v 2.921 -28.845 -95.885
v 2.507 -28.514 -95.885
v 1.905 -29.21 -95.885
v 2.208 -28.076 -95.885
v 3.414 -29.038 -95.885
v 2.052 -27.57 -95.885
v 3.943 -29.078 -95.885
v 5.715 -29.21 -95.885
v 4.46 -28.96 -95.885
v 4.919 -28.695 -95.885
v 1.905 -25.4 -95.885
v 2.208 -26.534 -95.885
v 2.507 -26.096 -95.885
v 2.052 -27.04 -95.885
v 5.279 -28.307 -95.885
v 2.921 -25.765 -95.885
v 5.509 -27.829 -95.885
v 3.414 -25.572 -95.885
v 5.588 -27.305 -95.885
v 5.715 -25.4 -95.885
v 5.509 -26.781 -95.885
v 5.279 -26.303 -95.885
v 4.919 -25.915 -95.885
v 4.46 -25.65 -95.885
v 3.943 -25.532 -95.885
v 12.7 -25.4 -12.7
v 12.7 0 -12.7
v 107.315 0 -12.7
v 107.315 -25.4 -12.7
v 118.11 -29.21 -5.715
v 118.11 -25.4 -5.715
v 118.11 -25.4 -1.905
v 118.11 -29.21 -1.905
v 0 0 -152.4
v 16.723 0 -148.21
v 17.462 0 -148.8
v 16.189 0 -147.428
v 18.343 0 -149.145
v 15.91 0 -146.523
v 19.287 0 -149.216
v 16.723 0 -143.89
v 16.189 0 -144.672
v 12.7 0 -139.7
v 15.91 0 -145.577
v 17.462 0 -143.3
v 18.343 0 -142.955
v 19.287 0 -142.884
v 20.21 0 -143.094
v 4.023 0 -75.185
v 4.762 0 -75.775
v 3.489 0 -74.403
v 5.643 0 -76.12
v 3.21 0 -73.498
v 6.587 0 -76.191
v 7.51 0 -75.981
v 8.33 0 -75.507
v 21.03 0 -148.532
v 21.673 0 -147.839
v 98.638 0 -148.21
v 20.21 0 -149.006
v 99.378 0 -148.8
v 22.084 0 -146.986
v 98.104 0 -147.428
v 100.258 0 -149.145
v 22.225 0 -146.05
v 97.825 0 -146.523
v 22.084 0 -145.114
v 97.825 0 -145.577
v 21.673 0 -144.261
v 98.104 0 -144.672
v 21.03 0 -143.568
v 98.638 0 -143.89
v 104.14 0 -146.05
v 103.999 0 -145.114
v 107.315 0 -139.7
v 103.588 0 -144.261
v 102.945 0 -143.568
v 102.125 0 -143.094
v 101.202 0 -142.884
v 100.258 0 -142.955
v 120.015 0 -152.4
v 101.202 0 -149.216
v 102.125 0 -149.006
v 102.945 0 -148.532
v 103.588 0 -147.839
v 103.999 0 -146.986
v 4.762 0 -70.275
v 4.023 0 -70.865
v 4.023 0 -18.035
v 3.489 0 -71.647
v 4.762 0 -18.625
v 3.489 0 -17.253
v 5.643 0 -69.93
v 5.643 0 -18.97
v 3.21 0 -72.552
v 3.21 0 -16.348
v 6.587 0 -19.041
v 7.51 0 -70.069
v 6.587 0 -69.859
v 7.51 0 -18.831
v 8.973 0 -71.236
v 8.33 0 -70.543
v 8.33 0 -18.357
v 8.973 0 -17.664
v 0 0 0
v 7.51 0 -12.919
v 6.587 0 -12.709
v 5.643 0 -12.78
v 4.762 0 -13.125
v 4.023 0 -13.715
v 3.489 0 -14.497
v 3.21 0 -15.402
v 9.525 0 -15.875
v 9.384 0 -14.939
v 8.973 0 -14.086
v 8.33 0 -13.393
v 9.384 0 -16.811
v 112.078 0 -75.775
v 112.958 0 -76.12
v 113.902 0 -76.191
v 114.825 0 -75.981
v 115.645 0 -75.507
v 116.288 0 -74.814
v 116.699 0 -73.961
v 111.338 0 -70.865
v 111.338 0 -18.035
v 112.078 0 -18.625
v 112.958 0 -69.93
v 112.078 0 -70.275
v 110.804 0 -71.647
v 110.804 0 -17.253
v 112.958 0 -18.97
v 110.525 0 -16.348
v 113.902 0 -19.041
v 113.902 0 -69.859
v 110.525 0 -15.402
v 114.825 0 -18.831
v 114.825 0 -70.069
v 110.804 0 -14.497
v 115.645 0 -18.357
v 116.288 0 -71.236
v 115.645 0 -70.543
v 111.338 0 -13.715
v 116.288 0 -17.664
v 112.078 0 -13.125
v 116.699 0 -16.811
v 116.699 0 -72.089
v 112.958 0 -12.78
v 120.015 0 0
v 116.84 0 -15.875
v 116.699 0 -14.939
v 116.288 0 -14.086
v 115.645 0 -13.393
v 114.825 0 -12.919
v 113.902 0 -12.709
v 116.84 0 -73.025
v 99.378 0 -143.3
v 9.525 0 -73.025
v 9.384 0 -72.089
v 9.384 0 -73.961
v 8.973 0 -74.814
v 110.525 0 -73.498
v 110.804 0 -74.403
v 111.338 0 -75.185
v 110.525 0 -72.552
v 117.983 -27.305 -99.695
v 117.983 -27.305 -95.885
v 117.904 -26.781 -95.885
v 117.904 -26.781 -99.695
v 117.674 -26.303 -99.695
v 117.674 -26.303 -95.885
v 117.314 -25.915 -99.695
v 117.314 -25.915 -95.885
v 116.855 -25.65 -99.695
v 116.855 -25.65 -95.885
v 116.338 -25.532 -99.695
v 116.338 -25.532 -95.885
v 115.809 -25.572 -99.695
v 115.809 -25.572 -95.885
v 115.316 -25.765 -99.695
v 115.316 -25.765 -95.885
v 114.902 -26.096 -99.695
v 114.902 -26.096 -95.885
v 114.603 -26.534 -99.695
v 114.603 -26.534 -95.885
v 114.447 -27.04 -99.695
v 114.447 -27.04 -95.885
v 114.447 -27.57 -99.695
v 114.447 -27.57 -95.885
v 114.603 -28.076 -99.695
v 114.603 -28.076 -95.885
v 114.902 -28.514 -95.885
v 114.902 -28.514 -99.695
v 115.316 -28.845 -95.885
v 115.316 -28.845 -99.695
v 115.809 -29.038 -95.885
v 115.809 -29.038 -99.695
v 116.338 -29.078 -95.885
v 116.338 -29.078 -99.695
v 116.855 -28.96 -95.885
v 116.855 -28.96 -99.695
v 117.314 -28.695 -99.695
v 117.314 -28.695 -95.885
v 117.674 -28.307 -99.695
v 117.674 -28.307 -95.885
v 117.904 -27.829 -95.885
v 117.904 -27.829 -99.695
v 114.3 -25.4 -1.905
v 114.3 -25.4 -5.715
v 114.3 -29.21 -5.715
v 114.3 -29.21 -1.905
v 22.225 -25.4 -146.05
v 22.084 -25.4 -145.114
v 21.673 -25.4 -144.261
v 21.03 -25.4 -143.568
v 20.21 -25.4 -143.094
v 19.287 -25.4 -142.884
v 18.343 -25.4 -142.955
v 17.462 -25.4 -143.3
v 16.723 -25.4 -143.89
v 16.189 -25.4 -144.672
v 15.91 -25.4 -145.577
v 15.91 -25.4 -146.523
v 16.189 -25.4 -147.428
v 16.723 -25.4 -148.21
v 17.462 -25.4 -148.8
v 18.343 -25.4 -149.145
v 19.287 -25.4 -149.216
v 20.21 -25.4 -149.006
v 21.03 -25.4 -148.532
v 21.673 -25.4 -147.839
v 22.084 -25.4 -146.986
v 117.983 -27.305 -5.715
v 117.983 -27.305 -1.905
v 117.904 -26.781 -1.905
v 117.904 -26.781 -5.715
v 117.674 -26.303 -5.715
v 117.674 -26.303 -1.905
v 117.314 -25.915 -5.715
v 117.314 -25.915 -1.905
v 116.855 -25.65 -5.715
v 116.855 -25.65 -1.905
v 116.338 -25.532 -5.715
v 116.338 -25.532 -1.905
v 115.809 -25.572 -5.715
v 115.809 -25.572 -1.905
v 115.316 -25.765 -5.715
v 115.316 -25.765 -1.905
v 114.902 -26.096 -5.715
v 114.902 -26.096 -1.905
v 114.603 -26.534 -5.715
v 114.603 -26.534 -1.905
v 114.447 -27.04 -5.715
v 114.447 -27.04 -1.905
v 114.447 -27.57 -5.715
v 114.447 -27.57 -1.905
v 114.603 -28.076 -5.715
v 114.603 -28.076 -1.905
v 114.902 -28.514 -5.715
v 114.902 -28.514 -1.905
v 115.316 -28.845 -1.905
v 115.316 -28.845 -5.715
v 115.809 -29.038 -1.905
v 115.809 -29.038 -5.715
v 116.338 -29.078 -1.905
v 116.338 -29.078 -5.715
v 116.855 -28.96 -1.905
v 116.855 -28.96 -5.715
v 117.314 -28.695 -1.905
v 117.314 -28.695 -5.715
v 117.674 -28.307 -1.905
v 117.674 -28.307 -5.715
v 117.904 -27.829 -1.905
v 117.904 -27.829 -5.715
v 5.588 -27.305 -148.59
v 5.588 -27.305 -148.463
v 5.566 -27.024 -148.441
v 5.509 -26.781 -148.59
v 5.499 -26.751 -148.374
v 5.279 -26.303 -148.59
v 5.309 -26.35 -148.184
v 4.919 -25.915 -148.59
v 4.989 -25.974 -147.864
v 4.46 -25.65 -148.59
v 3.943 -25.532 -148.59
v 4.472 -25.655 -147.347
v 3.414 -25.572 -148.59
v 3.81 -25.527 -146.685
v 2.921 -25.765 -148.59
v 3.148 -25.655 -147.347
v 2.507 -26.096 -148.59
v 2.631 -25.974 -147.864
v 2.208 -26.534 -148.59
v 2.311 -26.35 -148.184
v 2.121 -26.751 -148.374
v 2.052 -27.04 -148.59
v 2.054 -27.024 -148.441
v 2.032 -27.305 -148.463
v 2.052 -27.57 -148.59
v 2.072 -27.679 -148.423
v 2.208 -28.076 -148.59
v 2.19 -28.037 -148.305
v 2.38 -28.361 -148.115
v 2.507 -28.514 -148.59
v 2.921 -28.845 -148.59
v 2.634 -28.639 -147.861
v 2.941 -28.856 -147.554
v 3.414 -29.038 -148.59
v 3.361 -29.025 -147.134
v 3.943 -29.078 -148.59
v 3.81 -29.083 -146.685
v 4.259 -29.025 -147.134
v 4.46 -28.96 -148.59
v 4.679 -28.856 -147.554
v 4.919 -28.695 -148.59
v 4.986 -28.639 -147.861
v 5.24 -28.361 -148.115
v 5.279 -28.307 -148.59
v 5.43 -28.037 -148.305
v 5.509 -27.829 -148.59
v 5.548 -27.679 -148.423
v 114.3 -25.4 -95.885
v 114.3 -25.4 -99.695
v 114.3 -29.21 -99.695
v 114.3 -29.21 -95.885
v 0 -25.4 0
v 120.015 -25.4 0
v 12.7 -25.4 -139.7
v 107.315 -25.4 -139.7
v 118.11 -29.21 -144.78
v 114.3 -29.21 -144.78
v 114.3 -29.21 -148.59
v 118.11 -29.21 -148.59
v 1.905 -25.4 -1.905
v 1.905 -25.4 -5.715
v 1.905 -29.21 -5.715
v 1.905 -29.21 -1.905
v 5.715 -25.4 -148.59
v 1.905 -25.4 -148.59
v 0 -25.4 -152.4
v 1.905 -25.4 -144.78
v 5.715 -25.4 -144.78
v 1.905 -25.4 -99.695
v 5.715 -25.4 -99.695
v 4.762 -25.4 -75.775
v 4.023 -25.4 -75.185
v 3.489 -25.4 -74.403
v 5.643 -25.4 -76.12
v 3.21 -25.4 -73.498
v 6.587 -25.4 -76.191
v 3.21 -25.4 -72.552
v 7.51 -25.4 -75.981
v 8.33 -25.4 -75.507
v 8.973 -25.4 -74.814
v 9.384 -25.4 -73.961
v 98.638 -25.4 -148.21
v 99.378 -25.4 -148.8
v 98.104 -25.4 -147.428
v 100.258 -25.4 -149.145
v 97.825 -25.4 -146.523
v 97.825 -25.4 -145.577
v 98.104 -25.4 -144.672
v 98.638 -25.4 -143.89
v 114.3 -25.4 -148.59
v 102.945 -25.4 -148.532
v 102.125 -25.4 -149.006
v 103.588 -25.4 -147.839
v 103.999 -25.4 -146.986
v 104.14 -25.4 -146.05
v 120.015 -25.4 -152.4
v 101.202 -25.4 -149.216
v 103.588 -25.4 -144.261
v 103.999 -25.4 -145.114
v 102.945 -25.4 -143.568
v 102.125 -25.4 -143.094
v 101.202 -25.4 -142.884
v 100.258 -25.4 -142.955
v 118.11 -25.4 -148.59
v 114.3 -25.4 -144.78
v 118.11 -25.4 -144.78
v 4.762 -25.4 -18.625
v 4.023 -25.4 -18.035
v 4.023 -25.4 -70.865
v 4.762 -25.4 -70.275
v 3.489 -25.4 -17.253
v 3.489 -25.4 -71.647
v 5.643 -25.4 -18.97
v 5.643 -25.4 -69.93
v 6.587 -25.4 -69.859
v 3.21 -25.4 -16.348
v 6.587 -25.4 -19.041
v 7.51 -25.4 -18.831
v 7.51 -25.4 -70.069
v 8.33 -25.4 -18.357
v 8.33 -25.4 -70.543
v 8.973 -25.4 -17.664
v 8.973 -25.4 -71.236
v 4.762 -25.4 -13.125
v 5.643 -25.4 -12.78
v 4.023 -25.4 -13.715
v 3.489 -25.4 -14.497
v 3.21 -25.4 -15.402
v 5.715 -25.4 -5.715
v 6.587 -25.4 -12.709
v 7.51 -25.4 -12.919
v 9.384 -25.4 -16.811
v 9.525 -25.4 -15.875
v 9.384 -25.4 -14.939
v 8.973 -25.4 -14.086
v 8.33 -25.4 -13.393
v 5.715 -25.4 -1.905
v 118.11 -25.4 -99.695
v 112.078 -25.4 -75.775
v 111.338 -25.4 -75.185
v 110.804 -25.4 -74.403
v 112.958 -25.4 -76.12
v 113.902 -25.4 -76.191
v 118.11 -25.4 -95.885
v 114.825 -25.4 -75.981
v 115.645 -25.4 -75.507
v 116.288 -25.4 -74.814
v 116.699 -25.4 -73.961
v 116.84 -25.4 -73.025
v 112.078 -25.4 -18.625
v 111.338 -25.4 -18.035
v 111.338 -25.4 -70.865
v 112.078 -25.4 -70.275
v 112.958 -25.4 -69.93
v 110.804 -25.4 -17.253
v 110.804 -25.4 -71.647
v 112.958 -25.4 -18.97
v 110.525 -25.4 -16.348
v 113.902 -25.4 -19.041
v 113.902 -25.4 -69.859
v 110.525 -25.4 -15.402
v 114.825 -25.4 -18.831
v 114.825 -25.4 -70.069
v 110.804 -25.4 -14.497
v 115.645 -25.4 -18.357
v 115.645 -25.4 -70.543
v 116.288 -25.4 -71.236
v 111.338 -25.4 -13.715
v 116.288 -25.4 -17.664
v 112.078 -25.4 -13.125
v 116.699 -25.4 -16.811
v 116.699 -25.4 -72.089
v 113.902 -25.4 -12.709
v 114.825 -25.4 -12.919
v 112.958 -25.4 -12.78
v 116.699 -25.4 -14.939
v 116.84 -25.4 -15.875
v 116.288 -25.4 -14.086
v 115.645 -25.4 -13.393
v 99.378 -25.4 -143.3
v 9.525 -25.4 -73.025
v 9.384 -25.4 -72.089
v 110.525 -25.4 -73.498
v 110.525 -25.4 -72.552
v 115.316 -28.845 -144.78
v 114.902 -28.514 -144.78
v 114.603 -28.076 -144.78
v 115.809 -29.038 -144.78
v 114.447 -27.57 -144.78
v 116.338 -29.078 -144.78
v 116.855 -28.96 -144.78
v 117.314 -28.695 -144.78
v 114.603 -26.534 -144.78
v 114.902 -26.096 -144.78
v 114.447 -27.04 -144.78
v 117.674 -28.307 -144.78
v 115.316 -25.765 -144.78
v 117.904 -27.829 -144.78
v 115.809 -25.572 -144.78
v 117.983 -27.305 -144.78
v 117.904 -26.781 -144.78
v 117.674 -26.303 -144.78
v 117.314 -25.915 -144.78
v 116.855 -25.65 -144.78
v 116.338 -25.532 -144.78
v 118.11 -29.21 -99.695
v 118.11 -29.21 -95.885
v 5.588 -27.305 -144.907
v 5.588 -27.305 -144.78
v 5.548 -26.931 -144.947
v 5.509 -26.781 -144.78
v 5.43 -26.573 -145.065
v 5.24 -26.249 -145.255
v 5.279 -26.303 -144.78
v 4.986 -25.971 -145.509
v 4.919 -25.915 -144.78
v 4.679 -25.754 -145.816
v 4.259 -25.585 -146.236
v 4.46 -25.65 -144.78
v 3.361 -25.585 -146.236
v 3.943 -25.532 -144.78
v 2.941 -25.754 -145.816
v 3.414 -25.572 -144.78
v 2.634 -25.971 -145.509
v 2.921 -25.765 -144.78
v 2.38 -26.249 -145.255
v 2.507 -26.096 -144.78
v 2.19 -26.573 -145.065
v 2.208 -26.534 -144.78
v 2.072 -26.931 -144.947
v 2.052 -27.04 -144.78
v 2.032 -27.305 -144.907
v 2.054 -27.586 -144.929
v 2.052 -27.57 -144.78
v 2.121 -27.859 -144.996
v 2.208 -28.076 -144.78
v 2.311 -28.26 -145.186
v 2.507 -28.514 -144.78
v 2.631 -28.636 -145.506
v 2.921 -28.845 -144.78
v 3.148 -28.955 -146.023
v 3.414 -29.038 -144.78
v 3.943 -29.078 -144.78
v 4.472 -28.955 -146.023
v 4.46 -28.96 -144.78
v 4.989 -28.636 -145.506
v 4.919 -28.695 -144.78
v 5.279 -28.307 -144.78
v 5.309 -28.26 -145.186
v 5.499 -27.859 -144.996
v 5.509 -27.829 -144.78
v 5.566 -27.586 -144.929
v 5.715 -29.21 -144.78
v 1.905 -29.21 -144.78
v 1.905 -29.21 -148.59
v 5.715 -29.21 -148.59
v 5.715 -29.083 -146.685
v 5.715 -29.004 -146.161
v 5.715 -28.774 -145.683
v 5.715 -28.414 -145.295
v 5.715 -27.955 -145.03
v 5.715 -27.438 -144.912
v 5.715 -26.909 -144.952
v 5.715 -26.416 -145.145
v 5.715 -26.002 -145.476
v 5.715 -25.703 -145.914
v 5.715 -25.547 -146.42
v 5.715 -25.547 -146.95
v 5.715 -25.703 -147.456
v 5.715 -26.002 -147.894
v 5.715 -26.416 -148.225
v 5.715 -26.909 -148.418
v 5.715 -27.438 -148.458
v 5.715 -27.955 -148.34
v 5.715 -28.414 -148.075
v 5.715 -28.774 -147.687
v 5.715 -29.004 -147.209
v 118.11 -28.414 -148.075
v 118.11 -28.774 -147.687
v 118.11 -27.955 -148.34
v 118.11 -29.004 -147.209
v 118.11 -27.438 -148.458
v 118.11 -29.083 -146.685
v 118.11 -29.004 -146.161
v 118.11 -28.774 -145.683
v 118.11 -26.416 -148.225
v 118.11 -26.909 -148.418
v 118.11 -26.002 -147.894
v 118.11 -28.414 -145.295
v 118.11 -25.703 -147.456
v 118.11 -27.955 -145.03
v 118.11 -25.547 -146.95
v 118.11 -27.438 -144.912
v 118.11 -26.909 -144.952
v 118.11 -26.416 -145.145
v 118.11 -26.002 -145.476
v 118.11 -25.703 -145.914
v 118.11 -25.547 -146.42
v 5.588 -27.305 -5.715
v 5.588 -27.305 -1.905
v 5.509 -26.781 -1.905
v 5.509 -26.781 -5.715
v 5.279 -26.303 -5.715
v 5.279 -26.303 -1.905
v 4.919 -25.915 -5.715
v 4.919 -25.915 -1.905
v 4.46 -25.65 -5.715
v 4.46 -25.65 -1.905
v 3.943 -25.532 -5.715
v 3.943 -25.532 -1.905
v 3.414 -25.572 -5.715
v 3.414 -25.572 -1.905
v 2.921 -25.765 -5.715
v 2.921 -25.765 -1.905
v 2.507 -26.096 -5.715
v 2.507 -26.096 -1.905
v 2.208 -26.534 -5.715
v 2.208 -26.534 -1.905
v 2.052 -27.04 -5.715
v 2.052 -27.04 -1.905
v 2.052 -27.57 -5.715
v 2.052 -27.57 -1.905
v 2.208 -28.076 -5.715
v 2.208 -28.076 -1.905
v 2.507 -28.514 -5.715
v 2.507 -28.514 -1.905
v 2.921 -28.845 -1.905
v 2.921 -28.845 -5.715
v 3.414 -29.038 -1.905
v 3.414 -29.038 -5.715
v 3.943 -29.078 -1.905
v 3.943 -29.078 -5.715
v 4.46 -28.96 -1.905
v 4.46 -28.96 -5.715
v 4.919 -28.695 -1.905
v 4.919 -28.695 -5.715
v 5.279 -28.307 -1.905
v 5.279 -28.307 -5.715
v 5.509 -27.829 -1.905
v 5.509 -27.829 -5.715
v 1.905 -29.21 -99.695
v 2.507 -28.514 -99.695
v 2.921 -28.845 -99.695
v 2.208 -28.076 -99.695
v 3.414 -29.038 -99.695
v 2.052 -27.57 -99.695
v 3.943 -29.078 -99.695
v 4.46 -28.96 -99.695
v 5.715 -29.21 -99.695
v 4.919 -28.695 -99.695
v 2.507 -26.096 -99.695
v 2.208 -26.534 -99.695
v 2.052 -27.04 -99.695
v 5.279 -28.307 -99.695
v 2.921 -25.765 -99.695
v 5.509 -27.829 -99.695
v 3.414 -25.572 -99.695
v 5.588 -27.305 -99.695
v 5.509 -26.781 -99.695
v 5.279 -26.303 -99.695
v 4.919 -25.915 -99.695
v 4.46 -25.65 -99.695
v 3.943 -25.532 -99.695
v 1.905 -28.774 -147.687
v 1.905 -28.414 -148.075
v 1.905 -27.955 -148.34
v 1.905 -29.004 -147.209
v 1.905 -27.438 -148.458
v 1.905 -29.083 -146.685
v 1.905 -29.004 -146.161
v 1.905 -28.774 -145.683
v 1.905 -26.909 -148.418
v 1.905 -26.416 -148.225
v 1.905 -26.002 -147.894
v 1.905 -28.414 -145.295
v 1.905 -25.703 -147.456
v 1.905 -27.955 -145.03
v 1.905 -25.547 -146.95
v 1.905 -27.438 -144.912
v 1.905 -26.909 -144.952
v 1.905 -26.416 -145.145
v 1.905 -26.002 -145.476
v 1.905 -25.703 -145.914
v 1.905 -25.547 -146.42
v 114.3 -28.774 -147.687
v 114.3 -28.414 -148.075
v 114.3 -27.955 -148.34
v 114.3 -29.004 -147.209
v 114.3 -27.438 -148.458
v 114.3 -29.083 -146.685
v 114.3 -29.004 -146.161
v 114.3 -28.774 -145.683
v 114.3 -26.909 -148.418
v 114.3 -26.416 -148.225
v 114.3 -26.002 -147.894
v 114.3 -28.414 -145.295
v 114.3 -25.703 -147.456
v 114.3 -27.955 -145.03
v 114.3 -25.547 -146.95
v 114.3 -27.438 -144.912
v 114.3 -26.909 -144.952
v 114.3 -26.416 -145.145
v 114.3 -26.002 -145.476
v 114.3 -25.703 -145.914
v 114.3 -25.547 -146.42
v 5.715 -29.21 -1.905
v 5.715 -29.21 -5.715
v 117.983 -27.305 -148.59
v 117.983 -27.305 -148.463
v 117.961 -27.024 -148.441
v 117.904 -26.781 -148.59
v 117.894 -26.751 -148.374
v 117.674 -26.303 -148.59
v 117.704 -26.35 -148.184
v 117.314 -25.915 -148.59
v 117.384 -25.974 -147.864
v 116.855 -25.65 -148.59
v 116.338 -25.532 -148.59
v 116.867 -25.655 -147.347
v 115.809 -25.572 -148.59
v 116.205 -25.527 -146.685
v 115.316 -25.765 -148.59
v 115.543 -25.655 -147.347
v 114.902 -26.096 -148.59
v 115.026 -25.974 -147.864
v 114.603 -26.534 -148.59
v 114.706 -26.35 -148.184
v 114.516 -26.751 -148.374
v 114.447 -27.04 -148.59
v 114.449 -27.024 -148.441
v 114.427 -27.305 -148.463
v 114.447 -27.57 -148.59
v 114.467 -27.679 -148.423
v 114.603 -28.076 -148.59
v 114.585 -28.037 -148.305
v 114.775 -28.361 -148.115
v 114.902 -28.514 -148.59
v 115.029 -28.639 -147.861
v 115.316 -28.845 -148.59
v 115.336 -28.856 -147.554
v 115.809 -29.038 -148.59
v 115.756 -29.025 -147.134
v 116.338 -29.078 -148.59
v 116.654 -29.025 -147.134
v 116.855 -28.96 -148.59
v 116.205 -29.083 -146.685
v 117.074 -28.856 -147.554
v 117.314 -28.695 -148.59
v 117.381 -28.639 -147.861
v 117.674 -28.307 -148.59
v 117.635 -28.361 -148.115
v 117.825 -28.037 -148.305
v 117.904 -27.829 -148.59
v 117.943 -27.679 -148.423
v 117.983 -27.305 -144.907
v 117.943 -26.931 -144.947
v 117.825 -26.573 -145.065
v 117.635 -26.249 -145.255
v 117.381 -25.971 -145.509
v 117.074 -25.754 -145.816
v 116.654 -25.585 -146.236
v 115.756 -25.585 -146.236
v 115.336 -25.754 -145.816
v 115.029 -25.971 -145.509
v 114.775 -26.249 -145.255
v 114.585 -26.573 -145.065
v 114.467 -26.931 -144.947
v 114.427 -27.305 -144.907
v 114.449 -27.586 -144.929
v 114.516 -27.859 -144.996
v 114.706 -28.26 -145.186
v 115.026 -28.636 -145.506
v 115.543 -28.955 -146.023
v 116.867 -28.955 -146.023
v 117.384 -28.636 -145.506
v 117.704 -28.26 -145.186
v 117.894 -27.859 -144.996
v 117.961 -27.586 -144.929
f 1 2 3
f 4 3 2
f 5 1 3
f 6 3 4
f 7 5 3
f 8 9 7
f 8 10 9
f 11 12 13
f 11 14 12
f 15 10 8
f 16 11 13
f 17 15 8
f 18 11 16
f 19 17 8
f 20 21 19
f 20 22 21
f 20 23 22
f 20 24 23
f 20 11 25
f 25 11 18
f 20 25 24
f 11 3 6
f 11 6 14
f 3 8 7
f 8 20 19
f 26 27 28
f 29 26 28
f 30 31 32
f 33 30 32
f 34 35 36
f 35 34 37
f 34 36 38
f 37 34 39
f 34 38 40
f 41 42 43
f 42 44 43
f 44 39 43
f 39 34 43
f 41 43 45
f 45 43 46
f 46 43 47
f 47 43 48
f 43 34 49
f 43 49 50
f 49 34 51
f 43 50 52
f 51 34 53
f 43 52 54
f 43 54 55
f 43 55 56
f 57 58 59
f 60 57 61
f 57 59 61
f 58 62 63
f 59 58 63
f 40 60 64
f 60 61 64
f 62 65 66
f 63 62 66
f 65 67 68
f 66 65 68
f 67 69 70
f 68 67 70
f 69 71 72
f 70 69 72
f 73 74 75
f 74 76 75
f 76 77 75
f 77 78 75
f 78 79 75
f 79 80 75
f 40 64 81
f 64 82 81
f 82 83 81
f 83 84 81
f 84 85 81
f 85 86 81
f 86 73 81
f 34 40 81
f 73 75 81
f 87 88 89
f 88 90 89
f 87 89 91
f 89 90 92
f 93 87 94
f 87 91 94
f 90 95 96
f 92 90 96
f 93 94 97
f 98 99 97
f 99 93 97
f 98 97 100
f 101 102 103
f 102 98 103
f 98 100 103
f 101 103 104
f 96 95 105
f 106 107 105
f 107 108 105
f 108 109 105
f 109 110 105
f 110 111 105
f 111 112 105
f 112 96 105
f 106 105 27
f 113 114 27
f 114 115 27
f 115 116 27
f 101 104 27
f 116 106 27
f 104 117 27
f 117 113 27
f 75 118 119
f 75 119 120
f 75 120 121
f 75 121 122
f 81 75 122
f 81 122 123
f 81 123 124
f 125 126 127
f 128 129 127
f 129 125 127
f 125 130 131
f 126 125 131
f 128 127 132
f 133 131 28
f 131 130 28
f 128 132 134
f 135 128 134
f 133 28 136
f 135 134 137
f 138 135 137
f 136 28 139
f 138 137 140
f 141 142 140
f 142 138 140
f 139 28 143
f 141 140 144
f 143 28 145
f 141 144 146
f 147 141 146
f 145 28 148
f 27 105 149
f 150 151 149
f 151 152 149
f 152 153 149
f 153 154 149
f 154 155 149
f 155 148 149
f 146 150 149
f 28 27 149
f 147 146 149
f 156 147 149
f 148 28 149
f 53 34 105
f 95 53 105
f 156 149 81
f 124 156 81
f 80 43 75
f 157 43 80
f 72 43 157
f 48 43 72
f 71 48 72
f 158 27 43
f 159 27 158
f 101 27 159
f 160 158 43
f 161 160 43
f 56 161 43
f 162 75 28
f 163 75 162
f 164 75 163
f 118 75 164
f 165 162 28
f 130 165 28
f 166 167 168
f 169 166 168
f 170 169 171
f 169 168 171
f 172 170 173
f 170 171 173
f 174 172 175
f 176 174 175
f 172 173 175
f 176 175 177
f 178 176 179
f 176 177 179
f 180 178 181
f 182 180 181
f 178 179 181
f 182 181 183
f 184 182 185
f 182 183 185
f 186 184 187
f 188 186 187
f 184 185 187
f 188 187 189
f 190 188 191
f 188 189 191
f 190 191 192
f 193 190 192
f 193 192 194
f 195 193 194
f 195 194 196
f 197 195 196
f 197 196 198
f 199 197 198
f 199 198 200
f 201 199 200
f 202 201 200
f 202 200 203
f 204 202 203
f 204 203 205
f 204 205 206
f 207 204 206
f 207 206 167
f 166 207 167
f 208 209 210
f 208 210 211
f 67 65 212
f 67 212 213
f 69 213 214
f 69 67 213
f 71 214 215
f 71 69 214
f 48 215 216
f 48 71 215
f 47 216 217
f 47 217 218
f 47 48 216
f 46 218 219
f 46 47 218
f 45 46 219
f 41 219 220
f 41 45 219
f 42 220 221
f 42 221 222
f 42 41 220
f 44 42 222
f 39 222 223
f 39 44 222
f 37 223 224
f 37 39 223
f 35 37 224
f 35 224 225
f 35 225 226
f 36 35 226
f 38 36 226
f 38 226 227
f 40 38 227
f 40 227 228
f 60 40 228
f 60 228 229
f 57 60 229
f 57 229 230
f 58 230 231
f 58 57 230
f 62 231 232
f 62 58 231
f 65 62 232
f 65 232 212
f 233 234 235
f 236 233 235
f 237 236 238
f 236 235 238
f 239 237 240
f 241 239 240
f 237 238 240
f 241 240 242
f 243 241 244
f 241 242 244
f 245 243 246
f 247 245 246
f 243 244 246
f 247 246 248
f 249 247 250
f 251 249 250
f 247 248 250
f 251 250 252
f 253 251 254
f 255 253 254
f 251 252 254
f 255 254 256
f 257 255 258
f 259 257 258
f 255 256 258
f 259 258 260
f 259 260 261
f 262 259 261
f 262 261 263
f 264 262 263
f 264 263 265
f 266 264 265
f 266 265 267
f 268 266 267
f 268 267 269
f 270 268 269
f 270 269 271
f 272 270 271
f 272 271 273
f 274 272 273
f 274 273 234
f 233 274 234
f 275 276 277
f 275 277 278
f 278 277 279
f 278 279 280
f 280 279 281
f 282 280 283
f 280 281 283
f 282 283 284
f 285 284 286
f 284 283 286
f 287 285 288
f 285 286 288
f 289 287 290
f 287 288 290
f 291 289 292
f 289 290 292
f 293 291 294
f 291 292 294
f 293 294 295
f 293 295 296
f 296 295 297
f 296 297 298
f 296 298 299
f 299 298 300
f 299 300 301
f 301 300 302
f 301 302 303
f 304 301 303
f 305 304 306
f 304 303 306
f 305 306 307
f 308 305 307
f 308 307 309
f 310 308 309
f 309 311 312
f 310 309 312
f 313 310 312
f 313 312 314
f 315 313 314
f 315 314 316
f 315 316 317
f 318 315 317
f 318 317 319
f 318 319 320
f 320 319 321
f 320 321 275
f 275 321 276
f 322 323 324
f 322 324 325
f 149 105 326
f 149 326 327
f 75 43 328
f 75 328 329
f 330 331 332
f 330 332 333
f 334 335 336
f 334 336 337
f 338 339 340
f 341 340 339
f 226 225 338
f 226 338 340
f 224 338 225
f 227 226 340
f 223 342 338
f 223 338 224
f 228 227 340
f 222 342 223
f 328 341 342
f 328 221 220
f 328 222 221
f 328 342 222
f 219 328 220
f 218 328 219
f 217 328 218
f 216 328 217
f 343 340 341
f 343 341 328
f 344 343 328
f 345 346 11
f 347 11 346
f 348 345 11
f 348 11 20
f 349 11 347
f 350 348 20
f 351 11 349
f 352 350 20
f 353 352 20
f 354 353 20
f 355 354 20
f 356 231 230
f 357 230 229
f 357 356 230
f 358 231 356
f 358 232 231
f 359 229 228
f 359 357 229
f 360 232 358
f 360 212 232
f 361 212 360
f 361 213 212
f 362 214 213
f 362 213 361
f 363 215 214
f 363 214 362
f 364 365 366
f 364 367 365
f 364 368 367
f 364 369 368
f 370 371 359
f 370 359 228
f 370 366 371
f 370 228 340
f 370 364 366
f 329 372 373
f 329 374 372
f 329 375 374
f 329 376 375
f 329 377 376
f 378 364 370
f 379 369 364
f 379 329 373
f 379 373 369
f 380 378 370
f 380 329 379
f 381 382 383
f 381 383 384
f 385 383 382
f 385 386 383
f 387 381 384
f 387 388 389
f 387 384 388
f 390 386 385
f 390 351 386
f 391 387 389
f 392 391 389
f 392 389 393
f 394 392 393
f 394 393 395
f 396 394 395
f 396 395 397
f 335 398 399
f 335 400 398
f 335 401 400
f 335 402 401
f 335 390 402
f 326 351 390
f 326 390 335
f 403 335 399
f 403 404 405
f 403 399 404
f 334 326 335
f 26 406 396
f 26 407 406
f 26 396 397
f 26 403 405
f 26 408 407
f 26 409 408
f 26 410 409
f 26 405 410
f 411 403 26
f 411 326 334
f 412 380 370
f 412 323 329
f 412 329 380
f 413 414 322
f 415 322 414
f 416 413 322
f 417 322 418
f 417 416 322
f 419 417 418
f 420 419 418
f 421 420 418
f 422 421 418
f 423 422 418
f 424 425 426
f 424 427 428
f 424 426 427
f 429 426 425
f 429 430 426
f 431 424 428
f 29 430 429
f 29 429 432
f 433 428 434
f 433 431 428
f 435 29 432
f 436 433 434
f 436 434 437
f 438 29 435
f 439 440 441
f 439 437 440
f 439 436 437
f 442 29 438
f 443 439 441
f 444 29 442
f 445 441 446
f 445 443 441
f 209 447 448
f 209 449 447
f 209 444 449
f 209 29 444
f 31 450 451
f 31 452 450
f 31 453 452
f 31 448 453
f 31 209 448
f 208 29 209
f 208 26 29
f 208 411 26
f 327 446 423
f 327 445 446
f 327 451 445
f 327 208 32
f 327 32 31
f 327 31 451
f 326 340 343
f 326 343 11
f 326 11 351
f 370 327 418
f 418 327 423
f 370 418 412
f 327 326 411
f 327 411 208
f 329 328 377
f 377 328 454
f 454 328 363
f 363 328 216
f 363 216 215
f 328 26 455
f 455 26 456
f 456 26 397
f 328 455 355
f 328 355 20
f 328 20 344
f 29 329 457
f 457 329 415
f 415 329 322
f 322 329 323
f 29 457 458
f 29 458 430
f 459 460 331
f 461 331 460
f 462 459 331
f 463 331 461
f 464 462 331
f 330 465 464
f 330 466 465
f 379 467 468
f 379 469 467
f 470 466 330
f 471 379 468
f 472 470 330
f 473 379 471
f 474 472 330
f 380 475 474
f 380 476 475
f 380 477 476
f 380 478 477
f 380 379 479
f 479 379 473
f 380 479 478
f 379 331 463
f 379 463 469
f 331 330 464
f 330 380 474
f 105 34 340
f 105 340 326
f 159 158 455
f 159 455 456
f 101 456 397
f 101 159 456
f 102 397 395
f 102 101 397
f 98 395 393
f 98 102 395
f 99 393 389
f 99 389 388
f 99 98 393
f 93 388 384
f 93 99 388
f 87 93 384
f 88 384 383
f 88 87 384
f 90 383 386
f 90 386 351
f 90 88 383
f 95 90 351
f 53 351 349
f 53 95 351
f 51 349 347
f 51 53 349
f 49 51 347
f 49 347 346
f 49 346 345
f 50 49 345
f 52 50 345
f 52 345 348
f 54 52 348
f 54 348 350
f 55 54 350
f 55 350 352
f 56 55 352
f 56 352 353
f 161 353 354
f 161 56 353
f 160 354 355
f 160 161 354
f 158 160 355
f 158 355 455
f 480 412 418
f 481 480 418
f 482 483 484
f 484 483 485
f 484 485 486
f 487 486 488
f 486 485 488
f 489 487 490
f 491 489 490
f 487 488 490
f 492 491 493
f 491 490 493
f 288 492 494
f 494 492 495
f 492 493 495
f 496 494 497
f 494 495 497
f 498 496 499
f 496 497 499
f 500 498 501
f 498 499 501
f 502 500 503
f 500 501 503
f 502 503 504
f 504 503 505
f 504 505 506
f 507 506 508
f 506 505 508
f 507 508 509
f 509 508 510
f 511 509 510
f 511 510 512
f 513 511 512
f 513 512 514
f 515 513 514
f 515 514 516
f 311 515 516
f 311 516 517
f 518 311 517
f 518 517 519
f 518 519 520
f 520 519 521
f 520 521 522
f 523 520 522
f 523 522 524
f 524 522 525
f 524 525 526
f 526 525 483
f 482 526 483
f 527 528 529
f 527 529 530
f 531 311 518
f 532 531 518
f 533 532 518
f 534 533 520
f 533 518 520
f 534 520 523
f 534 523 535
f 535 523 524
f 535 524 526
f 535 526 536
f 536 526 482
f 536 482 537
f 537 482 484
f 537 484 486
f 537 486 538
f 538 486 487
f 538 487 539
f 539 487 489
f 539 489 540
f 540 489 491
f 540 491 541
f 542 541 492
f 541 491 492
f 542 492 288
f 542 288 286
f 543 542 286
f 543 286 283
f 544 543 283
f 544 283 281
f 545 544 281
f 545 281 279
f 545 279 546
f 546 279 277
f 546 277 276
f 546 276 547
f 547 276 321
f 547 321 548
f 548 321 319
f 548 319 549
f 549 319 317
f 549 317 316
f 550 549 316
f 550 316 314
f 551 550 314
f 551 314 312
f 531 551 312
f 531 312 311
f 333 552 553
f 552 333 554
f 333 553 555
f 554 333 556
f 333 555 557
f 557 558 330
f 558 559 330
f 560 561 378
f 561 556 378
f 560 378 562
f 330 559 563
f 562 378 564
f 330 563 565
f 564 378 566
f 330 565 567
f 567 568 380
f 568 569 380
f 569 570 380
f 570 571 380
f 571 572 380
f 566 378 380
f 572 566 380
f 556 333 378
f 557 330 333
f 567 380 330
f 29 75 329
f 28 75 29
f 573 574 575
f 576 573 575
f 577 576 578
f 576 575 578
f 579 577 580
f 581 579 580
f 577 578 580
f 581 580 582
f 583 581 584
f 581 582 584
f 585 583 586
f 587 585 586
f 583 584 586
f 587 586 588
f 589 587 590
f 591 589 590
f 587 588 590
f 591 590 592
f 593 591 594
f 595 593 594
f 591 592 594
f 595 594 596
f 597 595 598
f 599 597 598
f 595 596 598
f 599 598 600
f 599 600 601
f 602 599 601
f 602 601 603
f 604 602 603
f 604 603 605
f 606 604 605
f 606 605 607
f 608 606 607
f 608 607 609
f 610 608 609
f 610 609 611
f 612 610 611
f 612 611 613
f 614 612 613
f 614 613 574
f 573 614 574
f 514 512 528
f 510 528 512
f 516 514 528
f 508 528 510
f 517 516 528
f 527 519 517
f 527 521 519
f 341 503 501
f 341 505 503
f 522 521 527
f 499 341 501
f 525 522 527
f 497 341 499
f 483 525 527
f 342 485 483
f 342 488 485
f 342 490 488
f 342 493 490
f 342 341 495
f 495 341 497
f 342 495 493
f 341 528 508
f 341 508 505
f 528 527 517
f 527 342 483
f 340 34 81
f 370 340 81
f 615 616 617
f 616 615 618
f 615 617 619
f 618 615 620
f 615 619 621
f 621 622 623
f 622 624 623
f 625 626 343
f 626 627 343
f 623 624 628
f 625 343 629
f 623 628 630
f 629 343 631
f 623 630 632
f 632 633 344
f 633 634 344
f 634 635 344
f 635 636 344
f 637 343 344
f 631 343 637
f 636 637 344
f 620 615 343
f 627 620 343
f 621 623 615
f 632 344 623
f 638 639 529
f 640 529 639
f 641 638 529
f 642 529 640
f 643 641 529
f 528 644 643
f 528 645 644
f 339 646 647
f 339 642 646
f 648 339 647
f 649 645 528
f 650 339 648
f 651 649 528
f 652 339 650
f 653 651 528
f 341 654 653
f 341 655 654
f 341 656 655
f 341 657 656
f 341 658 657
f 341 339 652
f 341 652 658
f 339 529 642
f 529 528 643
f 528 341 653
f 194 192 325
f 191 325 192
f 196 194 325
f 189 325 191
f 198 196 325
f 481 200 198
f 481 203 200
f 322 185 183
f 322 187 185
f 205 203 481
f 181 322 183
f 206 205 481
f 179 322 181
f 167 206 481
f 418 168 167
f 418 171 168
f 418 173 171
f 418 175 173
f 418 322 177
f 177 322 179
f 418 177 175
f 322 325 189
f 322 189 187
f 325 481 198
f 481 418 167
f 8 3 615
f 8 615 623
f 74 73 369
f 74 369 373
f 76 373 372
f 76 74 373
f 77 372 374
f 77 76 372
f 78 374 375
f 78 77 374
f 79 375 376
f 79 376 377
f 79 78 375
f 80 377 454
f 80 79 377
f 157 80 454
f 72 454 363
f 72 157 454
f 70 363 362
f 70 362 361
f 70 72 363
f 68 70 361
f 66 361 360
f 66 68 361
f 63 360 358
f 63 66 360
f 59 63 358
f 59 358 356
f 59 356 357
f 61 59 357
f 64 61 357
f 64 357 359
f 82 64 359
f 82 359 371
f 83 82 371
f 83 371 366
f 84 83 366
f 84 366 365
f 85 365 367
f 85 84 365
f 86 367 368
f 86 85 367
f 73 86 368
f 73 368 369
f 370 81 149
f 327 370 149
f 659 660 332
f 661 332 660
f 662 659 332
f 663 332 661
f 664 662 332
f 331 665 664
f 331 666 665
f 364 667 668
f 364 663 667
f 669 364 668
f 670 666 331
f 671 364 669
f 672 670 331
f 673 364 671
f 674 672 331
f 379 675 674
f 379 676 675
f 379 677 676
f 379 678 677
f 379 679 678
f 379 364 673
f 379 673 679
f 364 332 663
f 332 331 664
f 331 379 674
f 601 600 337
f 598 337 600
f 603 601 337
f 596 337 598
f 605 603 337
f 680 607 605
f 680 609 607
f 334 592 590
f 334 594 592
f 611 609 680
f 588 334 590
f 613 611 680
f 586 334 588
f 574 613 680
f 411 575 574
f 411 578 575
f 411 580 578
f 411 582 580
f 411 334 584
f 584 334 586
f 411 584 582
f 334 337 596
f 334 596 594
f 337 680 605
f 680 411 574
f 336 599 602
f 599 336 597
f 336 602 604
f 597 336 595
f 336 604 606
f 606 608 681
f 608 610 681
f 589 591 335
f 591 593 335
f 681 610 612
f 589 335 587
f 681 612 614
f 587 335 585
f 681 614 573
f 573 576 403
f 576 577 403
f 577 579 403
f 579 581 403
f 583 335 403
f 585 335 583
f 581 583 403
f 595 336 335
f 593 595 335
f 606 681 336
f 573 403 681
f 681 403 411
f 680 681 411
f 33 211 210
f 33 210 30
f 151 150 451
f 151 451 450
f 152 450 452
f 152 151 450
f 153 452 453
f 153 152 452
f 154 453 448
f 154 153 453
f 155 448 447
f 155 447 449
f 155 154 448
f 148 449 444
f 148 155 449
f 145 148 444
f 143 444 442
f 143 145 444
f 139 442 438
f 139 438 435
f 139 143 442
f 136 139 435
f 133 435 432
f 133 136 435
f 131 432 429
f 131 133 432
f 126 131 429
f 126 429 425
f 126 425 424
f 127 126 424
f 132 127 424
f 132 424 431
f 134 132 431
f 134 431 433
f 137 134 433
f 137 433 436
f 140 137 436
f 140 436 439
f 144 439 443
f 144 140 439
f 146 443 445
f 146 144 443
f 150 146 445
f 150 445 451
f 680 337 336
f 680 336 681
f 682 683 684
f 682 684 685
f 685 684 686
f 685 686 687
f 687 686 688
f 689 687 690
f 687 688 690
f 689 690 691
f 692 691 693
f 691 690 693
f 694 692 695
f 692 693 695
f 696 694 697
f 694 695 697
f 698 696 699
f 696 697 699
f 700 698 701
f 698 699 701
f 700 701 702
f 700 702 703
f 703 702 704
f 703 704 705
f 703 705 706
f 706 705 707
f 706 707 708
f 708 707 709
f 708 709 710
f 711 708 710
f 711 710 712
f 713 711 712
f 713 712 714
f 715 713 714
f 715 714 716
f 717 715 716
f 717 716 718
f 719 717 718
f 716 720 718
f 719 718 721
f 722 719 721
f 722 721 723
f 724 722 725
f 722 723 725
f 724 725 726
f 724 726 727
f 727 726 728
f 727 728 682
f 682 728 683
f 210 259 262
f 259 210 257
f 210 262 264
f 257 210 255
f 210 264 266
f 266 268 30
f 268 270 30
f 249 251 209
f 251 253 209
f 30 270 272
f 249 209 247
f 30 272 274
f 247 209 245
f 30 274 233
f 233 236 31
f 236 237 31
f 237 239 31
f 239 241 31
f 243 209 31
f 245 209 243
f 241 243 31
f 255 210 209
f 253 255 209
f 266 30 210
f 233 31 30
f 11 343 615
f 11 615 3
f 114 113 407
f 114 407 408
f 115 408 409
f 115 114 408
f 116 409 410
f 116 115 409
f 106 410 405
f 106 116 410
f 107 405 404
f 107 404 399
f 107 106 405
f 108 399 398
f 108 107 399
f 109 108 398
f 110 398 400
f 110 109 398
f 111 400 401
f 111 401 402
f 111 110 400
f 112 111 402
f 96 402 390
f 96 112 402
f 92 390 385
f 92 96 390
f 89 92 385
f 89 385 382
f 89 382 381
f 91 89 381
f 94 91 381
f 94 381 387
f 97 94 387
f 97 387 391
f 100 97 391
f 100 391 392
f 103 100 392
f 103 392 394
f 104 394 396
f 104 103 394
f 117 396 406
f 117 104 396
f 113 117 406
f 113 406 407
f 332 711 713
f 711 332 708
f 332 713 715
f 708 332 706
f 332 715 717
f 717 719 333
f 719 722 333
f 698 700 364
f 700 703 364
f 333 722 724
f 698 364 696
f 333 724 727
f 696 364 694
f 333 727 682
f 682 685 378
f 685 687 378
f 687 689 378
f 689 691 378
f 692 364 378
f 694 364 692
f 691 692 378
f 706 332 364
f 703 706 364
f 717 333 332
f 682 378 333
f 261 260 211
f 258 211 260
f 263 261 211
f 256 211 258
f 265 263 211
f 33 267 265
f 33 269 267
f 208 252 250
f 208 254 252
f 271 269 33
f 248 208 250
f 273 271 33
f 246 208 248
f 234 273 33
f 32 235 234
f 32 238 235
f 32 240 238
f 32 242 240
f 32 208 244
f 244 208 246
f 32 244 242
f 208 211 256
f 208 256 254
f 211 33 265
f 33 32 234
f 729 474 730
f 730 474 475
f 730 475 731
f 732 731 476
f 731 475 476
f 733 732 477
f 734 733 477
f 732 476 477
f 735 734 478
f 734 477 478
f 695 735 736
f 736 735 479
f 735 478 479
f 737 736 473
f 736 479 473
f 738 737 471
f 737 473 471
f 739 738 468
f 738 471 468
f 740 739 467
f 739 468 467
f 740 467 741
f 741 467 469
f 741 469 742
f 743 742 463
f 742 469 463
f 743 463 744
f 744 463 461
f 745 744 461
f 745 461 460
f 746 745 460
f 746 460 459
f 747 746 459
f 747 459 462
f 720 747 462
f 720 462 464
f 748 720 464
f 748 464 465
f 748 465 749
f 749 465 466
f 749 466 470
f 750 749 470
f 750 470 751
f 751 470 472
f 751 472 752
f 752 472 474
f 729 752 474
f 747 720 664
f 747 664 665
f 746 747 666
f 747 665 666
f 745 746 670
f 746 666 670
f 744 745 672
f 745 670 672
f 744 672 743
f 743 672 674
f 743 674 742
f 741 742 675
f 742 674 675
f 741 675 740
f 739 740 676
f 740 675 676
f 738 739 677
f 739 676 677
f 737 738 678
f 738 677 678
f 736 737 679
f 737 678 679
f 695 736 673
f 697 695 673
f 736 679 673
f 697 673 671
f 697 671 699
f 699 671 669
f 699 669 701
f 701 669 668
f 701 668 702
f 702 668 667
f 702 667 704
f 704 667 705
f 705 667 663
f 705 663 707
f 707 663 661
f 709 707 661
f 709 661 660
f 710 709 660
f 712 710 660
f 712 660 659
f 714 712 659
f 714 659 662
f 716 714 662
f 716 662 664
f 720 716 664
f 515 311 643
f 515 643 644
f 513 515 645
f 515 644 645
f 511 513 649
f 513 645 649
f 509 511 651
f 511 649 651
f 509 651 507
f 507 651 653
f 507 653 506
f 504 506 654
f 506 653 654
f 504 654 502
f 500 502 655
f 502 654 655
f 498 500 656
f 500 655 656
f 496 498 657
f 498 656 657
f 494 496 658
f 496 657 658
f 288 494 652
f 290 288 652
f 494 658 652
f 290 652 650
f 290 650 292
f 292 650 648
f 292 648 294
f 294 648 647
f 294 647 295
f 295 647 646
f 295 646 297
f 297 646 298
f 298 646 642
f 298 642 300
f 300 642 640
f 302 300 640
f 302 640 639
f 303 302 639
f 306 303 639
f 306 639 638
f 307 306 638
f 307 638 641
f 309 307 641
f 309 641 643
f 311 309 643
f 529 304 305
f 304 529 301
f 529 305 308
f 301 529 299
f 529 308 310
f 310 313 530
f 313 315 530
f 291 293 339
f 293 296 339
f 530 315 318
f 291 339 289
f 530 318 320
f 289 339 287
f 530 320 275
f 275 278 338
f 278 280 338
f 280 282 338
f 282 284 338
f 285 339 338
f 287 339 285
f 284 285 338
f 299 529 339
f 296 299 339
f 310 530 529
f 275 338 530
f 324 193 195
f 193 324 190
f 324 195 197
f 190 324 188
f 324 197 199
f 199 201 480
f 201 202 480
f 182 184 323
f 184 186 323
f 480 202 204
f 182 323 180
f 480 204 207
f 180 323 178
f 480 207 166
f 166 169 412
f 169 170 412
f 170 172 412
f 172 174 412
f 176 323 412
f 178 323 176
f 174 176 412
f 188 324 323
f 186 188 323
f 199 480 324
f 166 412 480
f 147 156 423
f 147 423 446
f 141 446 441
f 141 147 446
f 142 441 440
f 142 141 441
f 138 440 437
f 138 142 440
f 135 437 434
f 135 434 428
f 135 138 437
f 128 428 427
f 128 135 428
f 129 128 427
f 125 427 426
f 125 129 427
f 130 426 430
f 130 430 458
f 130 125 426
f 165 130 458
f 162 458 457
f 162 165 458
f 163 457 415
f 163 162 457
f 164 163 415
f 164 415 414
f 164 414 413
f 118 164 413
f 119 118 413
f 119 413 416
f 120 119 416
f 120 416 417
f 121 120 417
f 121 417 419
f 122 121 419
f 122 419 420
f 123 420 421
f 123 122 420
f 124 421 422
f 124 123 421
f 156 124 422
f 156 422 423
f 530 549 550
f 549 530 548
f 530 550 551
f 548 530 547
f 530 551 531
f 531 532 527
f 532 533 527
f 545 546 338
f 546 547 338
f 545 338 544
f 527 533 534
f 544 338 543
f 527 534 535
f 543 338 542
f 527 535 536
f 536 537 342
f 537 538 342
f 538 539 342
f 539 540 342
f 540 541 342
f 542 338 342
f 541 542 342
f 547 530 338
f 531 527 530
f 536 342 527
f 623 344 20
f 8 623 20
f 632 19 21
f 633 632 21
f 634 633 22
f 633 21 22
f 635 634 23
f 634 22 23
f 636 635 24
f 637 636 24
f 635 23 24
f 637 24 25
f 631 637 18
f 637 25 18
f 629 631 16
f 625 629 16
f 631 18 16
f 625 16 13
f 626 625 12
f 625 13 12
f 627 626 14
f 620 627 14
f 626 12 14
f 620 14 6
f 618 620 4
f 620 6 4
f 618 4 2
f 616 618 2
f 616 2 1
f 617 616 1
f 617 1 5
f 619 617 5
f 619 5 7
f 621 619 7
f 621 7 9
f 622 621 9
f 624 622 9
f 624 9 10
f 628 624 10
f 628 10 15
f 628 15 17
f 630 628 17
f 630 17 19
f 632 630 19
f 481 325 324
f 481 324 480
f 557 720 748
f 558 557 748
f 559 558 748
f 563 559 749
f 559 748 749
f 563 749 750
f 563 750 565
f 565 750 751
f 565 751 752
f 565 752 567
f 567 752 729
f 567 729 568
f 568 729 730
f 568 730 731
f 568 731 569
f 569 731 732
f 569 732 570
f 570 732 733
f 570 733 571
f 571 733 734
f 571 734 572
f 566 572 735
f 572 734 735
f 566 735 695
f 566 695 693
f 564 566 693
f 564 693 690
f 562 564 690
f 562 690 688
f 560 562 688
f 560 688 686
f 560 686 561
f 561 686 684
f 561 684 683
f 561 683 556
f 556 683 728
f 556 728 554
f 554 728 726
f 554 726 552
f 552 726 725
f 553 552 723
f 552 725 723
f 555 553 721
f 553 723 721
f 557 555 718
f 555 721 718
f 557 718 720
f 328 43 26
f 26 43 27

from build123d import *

# Parameters (mm, degrees)
F0_W     = 120.015
F0_H     = 152.4
F0_W_2   = 3.81
F0_H_2   = 3.81
F0_R     = 3.175
F0_W_3   = 94.615
F0_H_3   = 127
F1_DEPTH = 25.4
F2_DEPTH = 29.21
F3_R     = 1.778
F4_DEPTH = 118.111
F5_DEPTH = 29.21
F6_R     = 1.778
F7_DEPTH = 150.496
F8_R     = 1.778
F9_DEPTH = 150.496


with BuildPart() as f1:
    # F0 (on Front) → F1 (new body)
    with BuildSketch(Plane.XZ):
        with Locations((60.0075, -76.2)):
            Rectangle(F0_W, F0_H)
        with Locations((3.81, -146.685)):
            Rectangle(F0_W_2, F0_H_2, mode=Mode.SUBTRACT)
        with Locations((19.05, -146.05)):
            Circle(F0_R, mode=Mode.SUBTRACT)
        with Locations((3.81, -97.79)):
            Rectangle(F0_W_2, F0_H_2, mode=Mode.SUBTRACT)
        with Locations((100.965, -146.05)):
            Circle(F0_R, mode=Mode.SUBTRACT)
        with Locations((116.205, -146.685)):
            Rectangle(F0_W_2, F0_H_2, mode=Mode.SUBTRACT)
        with Locations((116.205, -97.79)):
            Rectangle(F0_W_2, F0_H_2, mode=Mode.SUBTRACT)
        with Locations((6.35, -73.025)):
            Circle(F0_R, mode=Mode.SUBTRACT)
        with Locations((60.0075, -76.2)):
            Rectangle(F0_W_3, F0_H_3, mode=Mode.SUBTRACT)
        with Locations((6.35, -15.875)):
            Circle(F0_R, mode=Mode.SUBTRACT)
        with Locations((3.81, -3.81)):
            Rectangle(F0_W_2, F0_H_2, mode=Mode.SUBTRACT)
        with Locations((113.665, -73.025)):
            Circle(F0_R, mode=Mode.SUBTRACT)
        with Locations((113.665, -15.875)):
            Circle(F0_R, mode=Mode.SUBTRACT)
        with Locations((116.205, -3.81)):
            Rectangle(F0_W_2, F0_H_2, mode=Mode.SUBTRACT)
    extrude(amount=F1_DEPTH)

    # F0 (on Front) → F2 (join)
    with BuildSketch(Plane.XZ):
        with Locations((116.205, -146.685)):
            Rectangle(F0_W_2, F0_H_2)
        with Locations((3.81, -146.685)):
            Rectangle(F0_W_2, F0_H_2)
    extrude(amount=F2_DEPTH)

    # F3 (on face) → F4 (cut, through all)
    with BuildSketch(Plane(origin=(1.905, 0, 0), x_dir=(0, -1, 0), z_dir=(-1, 0, 0))):
        with Locations((27.305, -146.685)):
            Circle(F3_R)
    extrude(amount=-F4_DEPTH, mode=Mode.SUBTRACT)

    # F0 (on Front) → F5 (join)
    with BuildSketch(Plane.XZ):
        with Locations((116.205, -97.79)):
            Rectangle(F0_W_2, F0_H_2)
        with Locations((116.205, -3.81)):
            Rectangle(F0_W_2, F0_H_2)
        with Locations((3.81, -3.81)):
            Rectangle(F0_W_2, F0_H_2)
        with Locations((3.81, -97.79)):
            Rectangle(F0_W_2, F0_H_2)
    extrude(amount=F5_DEPTH)

    # F6 (on face) → F7 (cut, through all)
    with BuildSketch(Plane.XY.offset(-1.905)):
        with Locations((3.81, -27.305)):
            Circle(F6_R)
    extrude(amount=-F7_DEPTH, mode=Mode.SUBTRACT)

    # F8 (on face) → F9 (cut, through all)
    with BuildSketch(Plane.XY.offset(-1.905)):
        with Locations((116.205, -27.305)):
            Circle(F8_R)
    extrude(amount=-F9_DEPTH, mode=Mode.SUBTRACT)


solid = f1.part
